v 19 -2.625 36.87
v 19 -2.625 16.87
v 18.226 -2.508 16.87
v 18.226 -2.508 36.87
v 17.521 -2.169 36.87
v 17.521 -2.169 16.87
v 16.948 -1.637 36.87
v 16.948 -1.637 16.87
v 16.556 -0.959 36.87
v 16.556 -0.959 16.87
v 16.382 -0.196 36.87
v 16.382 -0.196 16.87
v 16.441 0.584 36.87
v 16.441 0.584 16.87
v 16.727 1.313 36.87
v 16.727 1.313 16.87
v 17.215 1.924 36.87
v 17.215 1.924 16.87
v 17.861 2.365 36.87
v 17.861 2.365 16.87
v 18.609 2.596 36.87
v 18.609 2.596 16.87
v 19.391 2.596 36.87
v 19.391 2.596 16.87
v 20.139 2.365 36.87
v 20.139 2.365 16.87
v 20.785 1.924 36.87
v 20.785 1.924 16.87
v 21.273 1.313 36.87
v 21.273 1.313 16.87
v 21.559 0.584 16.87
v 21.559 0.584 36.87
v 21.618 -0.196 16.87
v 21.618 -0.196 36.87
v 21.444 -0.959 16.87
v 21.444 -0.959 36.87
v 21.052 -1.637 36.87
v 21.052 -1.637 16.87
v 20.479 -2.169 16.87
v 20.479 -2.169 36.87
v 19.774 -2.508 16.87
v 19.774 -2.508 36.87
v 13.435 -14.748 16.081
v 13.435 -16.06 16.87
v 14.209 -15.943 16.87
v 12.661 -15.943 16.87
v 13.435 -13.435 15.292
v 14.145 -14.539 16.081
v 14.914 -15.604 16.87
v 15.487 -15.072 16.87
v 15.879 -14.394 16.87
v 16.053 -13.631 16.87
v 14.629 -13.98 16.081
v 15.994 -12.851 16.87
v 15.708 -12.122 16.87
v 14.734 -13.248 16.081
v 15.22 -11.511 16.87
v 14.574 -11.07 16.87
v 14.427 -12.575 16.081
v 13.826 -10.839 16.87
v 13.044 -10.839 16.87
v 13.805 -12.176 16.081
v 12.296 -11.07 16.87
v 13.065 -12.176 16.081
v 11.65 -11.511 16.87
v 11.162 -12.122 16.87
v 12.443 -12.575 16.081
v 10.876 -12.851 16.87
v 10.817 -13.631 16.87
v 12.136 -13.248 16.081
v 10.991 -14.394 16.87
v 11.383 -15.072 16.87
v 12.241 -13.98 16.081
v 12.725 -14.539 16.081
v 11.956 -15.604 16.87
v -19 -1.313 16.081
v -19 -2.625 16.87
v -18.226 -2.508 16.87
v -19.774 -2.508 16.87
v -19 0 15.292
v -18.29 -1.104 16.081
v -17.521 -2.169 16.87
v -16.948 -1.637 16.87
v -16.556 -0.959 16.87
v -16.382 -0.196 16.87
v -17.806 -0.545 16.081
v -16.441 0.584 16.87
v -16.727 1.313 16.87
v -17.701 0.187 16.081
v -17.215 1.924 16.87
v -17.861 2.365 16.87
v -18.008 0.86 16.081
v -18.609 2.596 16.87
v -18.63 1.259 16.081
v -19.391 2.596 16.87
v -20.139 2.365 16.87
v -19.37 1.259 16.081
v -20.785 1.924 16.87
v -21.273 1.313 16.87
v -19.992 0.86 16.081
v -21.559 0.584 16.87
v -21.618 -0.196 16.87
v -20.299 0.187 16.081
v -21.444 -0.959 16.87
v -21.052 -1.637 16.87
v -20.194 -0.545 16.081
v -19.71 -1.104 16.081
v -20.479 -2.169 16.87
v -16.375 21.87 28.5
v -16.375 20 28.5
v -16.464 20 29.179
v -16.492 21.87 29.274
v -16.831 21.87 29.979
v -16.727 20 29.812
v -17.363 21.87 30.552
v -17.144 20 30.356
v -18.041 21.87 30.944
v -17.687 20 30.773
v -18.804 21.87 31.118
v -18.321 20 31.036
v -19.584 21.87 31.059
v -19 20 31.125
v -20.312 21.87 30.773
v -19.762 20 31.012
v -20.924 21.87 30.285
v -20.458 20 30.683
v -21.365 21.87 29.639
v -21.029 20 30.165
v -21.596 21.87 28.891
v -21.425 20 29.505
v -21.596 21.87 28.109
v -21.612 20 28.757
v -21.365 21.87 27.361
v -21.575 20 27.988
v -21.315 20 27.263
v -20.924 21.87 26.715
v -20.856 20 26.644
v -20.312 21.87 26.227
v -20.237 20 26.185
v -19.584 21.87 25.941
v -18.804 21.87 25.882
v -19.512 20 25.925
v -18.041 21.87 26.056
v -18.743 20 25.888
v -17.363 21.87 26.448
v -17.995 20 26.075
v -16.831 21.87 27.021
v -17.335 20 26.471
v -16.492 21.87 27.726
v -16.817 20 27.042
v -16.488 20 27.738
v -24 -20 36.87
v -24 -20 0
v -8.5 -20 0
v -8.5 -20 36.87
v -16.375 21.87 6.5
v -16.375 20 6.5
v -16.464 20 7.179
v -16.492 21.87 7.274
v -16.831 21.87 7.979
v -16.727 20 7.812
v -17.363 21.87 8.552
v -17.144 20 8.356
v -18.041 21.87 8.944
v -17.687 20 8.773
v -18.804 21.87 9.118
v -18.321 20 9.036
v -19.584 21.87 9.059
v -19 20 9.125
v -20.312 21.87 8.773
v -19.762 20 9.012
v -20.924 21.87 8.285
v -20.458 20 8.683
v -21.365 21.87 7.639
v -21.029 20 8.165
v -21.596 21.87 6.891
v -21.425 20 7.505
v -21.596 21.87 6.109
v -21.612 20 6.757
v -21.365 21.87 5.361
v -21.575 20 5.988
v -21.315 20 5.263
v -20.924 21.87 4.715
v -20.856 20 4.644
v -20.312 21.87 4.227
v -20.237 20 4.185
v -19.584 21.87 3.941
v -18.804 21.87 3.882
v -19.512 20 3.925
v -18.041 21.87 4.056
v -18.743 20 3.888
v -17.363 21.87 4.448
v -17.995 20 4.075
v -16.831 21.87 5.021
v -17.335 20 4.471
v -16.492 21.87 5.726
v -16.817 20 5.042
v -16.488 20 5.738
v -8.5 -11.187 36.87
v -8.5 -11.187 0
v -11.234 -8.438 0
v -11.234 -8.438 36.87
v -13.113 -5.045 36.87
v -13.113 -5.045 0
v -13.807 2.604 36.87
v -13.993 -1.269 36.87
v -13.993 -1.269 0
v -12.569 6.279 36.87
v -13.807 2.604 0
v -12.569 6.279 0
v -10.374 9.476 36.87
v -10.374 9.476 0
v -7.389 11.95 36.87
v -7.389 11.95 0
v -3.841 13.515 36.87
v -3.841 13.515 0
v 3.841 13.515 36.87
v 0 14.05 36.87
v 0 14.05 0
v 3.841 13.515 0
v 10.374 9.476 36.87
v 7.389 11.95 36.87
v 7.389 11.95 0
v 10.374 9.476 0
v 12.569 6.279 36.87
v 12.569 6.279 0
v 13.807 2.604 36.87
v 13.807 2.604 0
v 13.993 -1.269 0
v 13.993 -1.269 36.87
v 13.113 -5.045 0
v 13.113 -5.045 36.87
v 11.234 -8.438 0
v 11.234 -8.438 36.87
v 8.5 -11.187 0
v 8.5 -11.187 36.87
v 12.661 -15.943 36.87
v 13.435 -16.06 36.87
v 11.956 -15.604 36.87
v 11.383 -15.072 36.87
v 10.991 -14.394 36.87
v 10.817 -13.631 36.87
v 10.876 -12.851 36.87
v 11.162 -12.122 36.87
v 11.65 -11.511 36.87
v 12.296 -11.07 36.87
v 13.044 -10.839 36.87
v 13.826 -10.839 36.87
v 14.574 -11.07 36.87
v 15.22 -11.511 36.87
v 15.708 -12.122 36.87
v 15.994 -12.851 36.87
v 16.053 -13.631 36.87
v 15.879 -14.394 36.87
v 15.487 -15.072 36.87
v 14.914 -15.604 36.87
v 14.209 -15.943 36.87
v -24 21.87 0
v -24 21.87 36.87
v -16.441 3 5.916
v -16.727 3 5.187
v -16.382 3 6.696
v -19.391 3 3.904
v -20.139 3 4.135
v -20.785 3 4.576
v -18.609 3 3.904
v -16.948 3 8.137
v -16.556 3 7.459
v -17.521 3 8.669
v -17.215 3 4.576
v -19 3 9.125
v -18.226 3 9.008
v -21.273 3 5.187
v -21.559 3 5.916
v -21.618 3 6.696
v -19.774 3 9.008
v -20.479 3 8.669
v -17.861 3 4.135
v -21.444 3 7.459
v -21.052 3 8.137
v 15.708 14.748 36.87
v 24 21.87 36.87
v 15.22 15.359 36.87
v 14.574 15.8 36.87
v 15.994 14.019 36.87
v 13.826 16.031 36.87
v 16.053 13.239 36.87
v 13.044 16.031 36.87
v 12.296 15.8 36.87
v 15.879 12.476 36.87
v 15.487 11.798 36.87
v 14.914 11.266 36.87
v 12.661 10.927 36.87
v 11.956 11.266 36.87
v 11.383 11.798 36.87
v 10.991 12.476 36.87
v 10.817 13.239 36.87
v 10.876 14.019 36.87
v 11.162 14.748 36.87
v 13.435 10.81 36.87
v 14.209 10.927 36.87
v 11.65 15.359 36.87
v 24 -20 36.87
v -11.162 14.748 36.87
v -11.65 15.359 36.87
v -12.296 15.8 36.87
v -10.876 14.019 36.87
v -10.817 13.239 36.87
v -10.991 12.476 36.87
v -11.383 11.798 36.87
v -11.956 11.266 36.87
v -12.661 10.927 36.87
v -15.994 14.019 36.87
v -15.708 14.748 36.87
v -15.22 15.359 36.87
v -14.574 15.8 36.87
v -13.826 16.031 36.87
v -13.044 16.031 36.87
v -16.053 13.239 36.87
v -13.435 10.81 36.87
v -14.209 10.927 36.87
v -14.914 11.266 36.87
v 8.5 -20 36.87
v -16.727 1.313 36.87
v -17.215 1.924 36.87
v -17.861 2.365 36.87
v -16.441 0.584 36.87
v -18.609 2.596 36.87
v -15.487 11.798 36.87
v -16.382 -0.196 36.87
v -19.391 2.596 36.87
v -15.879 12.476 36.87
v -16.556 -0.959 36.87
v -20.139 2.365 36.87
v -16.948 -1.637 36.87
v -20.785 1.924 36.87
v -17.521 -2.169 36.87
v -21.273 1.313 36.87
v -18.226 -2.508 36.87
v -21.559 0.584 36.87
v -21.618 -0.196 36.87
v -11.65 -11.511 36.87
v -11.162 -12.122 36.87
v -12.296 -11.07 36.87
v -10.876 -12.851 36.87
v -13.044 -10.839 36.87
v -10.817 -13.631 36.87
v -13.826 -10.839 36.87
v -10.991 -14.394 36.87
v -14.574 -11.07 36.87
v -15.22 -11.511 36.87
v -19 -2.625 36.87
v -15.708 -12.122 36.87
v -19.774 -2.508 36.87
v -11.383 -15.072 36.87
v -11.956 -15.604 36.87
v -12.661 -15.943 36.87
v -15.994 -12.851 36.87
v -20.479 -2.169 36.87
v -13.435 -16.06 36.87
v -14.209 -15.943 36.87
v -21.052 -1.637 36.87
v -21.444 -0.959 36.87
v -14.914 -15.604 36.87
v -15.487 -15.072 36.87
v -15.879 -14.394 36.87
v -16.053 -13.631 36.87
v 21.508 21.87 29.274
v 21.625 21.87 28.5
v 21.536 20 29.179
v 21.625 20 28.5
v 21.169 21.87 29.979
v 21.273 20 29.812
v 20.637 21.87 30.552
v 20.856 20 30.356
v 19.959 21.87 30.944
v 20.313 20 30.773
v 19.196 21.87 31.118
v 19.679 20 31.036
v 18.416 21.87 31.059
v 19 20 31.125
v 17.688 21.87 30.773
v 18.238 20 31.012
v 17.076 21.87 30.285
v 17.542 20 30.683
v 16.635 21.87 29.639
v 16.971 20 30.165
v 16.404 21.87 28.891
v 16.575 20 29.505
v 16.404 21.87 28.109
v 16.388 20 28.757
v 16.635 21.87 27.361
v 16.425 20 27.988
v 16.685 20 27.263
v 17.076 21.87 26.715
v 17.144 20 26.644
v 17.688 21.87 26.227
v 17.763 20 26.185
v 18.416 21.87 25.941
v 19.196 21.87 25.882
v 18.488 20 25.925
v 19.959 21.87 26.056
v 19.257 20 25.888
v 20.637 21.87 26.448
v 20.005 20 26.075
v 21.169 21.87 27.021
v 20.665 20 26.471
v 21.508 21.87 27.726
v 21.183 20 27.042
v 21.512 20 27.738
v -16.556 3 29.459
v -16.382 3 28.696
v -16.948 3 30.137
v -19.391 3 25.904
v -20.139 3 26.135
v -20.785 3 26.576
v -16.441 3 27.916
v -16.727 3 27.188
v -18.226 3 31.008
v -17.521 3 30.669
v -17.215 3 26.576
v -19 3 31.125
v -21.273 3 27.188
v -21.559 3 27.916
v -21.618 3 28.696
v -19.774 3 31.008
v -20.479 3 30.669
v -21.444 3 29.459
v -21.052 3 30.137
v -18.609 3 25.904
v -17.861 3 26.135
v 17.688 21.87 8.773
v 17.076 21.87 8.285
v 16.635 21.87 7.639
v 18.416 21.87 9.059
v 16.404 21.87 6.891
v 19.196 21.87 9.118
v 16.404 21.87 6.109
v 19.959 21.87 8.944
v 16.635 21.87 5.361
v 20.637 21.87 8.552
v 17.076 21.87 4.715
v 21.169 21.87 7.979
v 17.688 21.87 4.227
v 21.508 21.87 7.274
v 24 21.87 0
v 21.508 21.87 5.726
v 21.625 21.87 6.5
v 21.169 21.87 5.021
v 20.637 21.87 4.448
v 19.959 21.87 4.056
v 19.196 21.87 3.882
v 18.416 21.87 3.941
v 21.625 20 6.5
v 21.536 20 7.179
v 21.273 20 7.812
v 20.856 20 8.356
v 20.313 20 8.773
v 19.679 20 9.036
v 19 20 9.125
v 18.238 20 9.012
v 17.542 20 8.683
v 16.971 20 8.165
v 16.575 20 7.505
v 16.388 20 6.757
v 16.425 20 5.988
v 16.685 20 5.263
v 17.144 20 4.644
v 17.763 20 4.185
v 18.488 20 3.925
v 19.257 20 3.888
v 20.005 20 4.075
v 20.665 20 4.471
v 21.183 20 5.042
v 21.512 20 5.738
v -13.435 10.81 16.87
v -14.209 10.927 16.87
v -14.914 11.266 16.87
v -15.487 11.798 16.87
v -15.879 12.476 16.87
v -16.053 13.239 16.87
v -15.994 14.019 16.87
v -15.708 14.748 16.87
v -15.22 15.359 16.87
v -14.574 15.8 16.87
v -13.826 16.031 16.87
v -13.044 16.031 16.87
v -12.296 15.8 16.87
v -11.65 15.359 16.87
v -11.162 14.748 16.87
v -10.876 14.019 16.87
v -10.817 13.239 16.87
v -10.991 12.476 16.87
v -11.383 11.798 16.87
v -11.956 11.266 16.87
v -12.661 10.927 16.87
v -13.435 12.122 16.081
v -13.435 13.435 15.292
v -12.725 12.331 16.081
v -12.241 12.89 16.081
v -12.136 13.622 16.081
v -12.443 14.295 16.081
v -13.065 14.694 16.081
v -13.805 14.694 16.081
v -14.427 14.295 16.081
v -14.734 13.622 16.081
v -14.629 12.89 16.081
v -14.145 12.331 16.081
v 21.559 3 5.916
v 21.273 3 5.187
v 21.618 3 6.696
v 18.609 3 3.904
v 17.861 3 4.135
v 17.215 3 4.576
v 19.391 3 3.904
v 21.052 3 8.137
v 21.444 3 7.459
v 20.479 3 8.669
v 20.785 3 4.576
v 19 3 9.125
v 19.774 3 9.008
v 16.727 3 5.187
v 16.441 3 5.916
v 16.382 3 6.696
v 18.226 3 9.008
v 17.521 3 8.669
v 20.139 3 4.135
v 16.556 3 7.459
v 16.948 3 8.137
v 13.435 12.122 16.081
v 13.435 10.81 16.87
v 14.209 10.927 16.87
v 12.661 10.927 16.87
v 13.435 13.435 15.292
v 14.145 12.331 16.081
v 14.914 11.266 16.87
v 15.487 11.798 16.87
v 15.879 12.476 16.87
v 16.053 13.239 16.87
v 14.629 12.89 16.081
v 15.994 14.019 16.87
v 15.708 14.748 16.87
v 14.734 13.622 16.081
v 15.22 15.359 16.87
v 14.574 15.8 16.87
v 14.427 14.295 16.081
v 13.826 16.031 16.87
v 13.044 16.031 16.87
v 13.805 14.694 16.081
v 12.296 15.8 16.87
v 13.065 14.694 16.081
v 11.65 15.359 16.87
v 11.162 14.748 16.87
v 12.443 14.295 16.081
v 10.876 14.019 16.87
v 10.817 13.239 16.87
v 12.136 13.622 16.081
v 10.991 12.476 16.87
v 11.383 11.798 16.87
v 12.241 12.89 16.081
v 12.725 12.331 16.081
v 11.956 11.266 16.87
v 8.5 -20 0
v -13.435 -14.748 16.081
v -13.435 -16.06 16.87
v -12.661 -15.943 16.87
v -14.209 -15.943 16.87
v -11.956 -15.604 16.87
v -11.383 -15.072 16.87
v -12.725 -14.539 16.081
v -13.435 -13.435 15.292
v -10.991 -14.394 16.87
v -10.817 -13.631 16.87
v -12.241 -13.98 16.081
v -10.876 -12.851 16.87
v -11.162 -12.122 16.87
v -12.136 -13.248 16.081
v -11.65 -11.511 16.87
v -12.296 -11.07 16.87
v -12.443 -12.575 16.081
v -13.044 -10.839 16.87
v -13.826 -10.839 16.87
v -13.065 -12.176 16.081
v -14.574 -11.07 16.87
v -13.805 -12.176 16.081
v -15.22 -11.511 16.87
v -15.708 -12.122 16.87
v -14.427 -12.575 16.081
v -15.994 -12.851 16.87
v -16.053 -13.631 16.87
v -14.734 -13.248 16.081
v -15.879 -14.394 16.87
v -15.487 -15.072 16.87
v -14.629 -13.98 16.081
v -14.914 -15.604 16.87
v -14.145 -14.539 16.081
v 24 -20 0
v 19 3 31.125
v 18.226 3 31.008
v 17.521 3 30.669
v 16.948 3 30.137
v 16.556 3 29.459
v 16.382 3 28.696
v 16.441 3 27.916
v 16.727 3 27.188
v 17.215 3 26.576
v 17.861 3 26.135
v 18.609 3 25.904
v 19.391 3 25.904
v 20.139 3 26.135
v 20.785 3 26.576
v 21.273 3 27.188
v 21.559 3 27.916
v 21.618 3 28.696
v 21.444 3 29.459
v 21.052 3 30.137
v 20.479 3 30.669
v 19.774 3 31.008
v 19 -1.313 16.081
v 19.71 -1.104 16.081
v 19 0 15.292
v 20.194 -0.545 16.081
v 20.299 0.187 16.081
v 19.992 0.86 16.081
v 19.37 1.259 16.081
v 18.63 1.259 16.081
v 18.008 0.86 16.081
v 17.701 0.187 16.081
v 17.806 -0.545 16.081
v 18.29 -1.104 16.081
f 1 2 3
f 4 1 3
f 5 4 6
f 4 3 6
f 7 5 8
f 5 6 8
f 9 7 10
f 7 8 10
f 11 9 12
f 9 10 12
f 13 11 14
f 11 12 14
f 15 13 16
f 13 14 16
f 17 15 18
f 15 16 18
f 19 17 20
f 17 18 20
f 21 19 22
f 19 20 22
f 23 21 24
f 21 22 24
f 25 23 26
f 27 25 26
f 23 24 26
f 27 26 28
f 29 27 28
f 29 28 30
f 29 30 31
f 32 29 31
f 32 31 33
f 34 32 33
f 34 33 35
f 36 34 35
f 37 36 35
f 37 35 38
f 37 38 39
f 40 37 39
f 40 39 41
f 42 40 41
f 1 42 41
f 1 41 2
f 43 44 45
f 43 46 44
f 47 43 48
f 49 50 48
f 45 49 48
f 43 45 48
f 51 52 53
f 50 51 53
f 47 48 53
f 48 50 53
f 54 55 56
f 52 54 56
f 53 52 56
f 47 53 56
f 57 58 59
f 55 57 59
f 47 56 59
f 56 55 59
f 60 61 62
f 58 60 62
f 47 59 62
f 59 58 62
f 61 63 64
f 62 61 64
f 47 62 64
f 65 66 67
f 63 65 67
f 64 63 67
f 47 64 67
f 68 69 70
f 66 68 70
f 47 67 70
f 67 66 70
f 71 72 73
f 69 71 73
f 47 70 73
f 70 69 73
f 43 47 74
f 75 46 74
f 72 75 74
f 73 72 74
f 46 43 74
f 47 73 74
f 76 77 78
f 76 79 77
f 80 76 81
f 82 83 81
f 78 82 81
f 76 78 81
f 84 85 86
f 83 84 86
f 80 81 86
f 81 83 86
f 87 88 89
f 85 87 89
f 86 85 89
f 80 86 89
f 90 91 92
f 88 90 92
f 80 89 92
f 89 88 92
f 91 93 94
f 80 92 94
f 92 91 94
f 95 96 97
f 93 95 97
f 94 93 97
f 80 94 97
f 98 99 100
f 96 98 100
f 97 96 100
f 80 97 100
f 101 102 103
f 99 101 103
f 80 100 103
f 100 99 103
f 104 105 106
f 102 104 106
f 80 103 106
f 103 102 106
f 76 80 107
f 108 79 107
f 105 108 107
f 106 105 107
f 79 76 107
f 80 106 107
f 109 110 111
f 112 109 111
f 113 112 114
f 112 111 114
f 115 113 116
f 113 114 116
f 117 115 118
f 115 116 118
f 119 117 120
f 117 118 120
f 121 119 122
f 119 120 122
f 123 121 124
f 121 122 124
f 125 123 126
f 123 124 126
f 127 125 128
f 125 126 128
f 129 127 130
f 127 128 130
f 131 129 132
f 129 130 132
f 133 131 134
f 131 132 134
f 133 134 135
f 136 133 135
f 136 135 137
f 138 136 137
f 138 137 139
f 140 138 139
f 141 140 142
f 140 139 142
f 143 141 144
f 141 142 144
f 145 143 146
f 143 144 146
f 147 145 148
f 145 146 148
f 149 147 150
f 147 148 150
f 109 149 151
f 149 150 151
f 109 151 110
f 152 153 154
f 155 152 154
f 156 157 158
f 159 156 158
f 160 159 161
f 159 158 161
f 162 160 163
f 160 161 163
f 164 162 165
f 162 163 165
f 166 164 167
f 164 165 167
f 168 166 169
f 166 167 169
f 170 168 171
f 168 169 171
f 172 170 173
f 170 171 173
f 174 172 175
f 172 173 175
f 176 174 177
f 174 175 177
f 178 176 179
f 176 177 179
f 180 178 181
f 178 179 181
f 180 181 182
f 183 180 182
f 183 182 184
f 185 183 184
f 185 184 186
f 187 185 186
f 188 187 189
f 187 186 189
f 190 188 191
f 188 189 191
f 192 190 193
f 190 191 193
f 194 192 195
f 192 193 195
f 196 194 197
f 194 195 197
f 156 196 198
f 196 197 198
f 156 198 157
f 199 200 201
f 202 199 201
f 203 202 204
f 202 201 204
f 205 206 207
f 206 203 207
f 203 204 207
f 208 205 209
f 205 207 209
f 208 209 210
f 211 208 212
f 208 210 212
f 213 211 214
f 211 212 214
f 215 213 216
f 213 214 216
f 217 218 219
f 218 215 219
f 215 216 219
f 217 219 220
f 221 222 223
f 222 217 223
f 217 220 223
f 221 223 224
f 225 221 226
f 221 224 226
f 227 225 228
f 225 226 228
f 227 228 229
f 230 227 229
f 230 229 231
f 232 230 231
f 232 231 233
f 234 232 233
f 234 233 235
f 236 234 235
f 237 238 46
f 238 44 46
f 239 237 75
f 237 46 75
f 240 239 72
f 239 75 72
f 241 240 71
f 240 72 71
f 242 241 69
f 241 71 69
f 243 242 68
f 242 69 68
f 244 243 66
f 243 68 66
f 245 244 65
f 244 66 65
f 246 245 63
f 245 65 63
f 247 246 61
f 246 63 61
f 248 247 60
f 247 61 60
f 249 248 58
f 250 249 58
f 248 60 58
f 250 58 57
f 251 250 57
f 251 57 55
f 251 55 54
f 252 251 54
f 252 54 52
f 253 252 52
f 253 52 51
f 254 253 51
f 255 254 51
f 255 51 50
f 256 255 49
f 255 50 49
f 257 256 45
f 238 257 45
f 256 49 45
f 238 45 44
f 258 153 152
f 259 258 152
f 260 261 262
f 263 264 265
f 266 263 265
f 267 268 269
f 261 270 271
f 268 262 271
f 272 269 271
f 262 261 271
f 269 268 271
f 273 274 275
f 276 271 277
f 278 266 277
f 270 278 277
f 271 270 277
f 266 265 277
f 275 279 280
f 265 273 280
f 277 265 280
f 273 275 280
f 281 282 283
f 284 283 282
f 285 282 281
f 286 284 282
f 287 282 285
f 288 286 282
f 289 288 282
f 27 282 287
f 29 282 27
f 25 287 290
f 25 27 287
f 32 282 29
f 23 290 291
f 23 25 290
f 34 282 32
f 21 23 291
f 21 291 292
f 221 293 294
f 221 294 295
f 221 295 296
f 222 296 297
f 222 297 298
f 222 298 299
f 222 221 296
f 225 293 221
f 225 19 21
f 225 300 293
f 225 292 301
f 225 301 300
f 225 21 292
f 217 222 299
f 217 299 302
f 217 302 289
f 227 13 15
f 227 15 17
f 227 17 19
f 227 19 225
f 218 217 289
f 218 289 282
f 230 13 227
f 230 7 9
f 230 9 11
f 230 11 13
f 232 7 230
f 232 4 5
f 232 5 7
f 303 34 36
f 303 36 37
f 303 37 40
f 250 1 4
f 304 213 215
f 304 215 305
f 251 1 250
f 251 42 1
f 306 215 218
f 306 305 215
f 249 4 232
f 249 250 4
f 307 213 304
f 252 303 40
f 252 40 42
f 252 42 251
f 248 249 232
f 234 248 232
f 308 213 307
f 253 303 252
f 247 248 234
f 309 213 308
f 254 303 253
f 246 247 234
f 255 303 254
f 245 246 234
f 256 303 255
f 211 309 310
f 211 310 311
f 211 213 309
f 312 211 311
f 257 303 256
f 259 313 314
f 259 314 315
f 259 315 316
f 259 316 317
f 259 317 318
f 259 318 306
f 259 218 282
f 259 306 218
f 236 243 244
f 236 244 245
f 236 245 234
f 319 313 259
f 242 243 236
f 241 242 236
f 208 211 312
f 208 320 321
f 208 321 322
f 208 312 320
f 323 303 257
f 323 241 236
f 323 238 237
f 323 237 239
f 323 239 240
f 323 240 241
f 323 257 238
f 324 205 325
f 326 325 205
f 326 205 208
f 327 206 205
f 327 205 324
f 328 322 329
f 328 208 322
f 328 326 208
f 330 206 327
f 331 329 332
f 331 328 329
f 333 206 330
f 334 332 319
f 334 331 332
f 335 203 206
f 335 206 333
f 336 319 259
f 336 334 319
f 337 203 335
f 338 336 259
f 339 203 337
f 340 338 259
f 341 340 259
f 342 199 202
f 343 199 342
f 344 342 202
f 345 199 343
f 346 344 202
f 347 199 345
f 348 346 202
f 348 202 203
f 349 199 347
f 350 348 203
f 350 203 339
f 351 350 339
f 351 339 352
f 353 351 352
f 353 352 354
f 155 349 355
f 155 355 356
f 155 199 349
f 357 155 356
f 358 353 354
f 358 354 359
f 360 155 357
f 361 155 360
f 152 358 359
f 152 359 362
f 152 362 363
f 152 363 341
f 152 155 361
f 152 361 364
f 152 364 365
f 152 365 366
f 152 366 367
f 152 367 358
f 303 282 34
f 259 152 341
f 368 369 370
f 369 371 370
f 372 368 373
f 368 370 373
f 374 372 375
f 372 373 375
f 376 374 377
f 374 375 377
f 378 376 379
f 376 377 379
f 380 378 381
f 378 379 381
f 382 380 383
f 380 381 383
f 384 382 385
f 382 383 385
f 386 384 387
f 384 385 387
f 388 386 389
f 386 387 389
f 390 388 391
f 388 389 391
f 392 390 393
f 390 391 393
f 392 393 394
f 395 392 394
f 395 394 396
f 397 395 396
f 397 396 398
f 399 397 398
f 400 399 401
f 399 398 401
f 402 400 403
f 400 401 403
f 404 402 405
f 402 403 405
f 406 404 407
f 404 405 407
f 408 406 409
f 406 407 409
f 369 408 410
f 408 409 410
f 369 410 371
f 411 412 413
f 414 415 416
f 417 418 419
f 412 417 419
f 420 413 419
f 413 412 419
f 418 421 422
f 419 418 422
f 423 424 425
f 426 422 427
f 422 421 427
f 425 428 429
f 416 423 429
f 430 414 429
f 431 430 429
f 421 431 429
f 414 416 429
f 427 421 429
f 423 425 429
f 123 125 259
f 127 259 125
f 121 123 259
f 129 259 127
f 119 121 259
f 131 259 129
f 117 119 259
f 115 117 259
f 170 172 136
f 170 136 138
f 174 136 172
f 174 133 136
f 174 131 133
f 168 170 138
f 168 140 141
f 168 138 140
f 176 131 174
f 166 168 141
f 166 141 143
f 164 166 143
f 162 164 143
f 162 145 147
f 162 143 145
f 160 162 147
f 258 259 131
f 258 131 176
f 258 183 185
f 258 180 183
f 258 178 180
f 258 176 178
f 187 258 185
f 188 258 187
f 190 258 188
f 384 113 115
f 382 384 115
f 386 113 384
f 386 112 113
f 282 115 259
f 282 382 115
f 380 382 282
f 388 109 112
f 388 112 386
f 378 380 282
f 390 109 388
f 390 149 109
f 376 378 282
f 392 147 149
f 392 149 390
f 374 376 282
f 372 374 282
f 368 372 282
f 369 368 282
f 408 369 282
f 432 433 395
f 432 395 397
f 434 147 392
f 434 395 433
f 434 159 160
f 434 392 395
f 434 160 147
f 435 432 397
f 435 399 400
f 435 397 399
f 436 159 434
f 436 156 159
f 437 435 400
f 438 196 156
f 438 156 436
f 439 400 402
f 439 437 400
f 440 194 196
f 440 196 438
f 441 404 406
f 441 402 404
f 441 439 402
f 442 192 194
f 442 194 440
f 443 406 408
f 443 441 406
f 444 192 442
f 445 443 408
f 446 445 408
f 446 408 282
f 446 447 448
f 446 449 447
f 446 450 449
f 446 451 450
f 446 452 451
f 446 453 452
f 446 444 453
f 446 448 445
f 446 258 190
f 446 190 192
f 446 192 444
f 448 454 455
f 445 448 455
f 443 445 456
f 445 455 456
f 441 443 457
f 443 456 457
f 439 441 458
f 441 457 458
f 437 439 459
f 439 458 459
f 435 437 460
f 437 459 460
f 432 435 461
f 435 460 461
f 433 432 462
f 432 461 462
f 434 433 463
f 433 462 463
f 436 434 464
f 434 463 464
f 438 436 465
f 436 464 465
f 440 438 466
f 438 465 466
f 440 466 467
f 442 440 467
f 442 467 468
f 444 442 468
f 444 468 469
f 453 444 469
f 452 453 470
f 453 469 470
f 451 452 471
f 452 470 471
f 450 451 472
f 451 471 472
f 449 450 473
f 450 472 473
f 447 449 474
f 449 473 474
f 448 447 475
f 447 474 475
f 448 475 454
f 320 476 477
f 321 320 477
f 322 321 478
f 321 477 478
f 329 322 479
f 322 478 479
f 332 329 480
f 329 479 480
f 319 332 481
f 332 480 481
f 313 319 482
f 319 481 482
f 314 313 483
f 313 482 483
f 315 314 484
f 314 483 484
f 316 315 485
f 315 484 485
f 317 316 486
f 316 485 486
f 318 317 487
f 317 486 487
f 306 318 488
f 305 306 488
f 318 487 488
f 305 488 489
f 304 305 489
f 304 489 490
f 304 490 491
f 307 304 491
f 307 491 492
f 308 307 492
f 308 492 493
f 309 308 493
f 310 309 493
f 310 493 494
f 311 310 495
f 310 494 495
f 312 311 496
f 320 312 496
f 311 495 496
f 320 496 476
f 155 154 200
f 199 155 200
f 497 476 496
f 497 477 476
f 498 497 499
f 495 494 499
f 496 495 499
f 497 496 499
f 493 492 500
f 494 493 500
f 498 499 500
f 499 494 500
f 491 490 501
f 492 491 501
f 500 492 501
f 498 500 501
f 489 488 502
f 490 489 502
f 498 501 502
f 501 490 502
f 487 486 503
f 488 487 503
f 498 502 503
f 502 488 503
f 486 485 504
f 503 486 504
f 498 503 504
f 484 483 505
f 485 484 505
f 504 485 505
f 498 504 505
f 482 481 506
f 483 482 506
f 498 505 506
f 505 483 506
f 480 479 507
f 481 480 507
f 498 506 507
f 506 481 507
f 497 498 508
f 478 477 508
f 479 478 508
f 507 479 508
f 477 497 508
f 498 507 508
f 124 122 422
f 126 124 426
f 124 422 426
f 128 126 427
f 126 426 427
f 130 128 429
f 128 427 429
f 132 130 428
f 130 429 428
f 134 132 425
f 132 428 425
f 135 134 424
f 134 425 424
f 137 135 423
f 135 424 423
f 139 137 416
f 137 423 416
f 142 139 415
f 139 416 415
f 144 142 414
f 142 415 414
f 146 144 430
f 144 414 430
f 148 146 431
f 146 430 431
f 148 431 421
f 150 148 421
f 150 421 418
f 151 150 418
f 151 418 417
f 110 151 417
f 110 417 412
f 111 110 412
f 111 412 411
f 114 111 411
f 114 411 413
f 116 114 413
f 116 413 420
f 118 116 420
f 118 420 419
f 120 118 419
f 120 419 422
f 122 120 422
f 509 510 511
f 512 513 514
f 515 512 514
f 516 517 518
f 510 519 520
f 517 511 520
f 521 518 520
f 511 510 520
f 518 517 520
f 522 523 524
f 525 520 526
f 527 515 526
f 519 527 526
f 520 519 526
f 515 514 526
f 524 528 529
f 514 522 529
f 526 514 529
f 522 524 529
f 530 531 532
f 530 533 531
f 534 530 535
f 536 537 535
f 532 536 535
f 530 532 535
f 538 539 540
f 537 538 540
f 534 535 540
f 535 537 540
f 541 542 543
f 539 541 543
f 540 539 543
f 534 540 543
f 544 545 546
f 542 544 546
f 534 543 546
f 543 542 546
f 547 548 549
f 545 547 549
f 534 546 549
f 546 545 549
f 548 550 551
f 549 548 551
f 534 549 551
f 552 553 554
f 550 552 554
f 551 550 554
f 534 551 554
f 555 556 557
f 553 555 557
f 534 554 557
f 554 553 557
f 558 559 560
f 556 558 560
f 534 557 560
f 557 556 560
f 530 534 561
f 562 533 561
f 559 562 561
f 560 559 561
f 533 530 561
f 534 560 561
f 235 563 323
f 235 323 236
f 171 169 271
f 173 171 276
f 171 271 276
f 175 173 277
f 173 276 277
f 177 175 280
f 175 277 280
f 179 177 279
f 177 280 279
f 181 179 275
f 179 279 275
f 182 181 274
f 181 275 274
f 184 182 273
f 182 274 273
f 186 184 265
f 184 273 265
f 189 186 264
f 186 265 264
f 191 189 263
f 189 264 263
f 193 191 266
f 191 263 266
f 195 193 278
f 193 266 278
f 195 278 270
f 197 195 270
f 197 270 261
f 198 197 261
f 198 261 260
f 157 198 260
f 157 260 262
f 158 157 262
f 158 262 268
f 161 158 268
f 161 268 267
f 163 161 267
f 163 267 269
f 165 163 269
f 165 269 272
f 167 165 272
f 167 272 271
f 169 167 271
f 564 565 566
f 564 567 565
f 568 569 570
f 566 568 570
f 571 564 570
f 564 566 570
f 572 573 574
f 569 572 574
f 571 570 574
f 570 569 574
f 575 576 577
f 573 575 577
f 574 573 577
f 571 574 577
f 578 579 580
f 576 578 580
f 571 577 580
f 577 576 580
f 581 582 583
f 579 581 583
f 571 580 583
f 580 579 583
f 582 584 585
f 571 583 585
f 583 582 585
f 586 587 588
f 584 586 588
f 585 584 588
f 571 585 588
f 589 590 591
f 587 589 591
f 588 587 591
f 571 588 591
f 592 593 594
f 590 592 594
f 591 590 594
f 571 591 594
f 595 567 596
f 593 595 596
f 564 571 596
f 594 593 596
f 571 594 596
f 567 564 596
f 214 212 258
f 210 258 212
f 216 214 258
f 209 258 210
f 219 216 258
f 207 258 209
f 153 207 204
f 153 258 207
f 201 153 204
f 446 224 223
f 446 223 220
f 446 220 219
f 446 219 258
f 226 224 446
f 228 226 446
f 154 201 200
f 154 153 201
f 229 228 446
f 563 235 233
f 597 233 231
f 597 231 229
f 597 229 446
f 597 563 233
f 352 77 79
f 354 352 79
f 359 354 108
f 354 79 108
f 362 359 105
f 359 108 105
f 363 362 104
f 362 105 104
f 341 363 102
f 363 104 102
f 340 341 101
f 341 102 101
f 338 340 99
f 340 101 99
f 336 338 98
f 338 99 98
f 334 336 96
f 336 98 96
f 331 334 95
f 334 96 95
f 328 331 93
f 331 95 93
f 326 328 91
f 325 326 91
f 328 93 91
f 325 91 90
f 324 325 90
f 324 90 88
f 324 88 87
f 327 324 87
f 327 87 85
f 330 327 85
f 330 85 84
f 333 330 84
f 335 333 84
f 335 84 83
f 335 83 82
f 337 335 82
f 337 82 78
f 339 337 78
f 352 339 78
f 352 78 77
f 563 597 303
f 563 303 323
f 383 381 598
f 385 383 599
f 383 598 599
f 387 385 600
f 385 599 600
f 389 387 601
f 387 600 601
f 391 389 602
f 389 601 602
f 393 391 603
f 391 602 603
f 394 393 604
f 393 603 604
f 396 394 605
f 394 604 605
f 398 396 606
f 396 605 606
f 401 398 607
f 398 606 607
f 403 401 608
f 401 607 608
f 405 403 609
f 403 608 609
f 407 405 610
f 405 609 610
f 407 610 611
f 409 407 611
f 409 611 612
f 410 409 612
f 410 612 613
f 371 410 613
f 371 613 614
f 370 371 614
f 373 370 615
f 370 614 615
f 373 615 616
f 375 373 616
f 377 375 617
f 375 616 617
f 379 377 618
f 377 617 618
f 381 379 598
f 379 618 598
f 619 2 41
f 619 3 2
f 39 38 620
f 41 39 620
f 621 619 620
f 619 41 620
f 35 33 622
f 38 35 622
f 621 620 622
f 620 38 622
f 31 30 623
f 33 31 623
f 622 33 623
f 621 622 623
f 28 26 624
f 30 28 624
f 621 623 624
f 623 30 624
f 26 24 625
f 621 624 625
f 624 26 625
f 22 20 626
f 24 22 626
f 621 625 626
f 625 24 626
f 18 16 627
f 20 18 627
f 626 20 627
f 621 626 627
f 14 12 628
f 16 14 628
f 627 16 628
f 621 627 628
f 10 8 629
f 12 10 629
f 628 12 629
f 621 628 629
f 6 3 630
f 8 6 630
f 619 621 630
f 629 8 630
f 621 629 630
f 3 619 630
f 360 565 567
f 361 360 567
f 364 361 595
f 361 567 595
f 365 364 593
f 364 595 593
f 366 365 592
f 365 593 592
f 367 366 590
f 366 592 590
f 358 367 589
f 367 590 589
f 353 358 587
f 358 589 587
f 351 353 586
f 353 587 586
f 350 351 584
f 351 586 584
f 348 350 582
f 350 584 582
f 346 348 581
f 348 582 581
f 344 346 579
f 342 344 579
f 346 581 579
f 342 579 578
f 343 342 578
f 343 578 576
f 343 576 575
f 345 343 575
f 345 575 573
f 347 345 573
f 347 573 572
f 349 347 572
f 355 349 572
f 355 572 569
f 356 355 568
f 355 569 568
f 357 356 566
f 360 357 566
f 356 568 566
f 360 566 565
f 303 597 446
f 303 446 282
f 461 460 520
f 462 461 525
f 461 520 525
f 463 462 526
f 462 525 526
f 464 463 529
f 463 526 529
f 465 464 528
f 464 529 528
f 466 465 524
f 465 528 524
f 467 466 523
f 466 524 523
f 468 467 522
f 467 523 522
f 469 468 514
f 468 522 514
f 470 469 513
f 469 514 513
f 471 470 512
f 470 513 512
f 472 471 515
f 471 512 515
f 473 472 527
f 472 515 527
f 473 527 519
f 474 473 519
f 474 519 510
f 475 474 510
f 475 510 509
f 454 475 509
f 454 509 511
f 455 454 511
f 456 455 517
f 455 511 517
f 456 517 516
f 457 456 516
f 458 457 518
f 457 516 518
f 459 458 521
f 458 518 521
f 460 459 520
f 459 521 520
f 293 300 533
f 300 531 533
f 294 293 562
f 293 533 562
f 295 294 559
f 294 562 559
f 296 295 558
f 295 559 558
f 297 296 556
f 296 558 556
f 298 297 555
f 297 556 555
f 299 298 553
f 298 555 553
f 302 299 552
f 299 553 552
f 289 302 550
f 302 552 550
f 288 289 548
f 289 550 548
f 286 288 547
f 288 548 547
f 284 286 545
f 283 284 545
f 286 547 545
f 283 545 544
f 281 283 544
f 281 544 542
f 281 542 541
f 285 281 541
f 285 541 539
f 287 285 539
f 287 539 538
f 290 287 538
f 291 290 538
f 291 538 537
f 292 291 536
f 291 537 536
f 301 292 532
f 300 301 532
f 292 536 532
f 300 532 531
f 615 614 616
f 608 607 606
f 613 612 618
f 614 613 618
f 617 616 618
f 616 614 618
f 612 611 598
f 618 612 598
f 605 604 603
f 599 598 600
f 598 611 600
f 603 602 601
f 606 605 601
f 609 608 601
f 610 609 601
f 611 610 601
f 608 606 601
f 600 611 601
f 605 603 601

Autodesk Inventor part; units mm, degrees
ref_plane "YZ Plane" through (0, 0, 0) normal (1, 0, 0) x (0, 1, 0)
ref_plane "XZ Plane" through (0, 0, 0) normal (0, 1, 0) x (-1, 0, 0)
ref_plane "XY Plane" through (0, 0, 0) normal (0, 0, 1) x (1, 0, 0)
sketch "Sketch1" plane through (0, 0, 0) normal (0, 0, 1) x (1, 0, 0)
  line L0 (-24, 20) -> (24, 20)
  line L1 (-24, 20) -> (-24, -20)
  line L2 (-24, -20) -> (-8.5, -20)
  line L3 (24, 20) -> (24, -20)
  line L4 (24, -20) -> (8.5, -20)
  arc A0 (8.5, -11.1872) -> (-8.5, -11.1872) centre (0, 0) ccw
  line L5 (-8.5, -20) -> (-8.5, -11.1872)
  line L6 (8.5, -20) -> (8.5, -11.1872)
  point P0 (0, 20)
  point P1 (-24, 0)
  dimension "d0" = 48
  dimension "d1" = 40
  dimension "d2" = 17
  dimension "d3" = 15.5
  dimension "d4" = 40
  dimension "d6" = 14.05
  dimension "d70" = 8.8128
extrude "Extrusion1" add sketch "Sketch1" along normal blind 36.8695
sketch "Sketch2" plane through (0, 0, 36.8695) normal (0, 0, 1) x (1, 0, 0)
  line L0 (-24, 20) -> (-24, -20) projected
  arc A0 (8.5, -11.1872) -> (-8.5, -11.1872) centre (0, 0) ccw projected
  circle A1 centre (0, 0) radius 19 construction
  point P0 (-19, 0)
  point P1 (-24, 0)
  point P2 (-13.435, -13.435)
  point P3 (-13.435, 13.435)
  point P4 (13.435, 13.435)
  point P5 (19, 0)
  point P6 (13.435, -13.435)
  dimension "d9" = 38
  dimension "d12" = 45
  dimension "d16" = 45
  dimension "d18" = 45
  dimension "d19" = 45
hole "Hole1" at (-19, 0, 36.8695) at (-13.435, -13.435, 36.8695) at (-13.435, 13.435, 36.8695) at (13.435, 13.435, 36.8695) at (19, 0, 36.8695) at (13.435, -13.435, 36.8695) direction (0, 0, -1) diameter 5.25 depth 20 tip angle 118
thread "Thread1" size "M5.5x0.5" class "6H" standard "ANSI Metric M Profile" full length
thread "Thread2" size "M5.5x0.5" class "6H" standard "ANSI Metric M Profile" full length
thread "Thread3" size "M5.5x0.5" class "6H" standard "ANSI Metric M Profile" full length
thread "Thread4" size "M5.5x0.5" class "6H" standard "ANSI Metric M Profile" full length
thread "Thread5" size "M5.5x0.5" class "6H" standard "ANSI Metric M Profile" full length
thread "Thread6" size "M5.5x0.5" class "6H" standard "ANSI Metric M Profile" full length
sketch "Sketch3" plane through (-24, 20, 0) normal (0, 1, 0) x (1, 0, 0)
  line L0 (0, 0) -> (48, 0) projected
  line L1 (0, 0) -> (0, -36.8695) projected
  point P0 (24, 0)
  point P1 (5, -6.5)
  point P2 (43, -6.5)
  point P3 (5, -28.5)
  point P4 (43, -28.5)
  dimension "d41" = 38
  dimension "d44" = 22
  dimension "d47" = 6.5
  dimension "d48" = 5
hole "Hole2" at (-19, 20, 6.5) at (19, 20, 6.5) at (-19, 20, 28.5) at (19, 20, 28.5) direction (0, -1, 0) diameter 5.25 depth 17
thread "Thread7" size "M5.5x0.5" class "6H" standard "ANSI Metric M Profile" full length
thread "Thread8" size "M5.5x0.5" class "6H" standard "ANSI Metric M Profile" full length
thread "Thread9" size "M5.5x0.5" class "6H" standard "ANSI Metric M Profile" full length
thread "Thread10" size "M5.5x0.5" class "6H" standard "ANSI Metric M Profile" full length
sketch "Sketch4" plane through (-24, 20, 0) normal (0, 1, 0) x (1, 0, 0)
  circle A0 centre (5, -28.5) radius 2.625 projected
  circle A1 centre (5, -6.5) radius 2.625 projected
  circle A2 centre (43, -6.5) radius 2.625 projected
  circle A3 centre (43, -28.5) radius 2.625 projected
  line L0 (0, 0) -> (48, 0) projected
  line L1 (0, 0) -> (0, -36.8695) projected
  line L2 (48, -36.8695) -> (0, -36.8695) projected
  line L3 (48, 0) -> (48, -36.8695) projected
  point P0 (24, 0)
  dimension "d64" = 48
  dimension "d65" = 36.8695
  dimension "d66" = 38
  dimension "d67" = 22
  dimension "d68" = 5
  dimension "d69" = 6.5
sketch "Sketch5" plane through (-24, 20, 0) normal (0, 1, 0) x (1, 0, 0)
  circle A0 centre (5, -28.5) radius 2.625 projected
  circle A1 centre (5, -6.5) radius 2.625 projected
  circle A2 centre (43, -6.5) radius 2.625 projected
  circle A3 centre (43, -28.5) radius 2.625 projected
  line L0 (0, 0) -> (48, 0) projected
  line L1 (0, 0) -> (0, -36.8695) projected
  line L2 (48, -36.8695) -> (0, -36.8695) projected
  line L3 (48, 0) -> (48, -36.8695) projected
  point P0 (24, 0)
extrude "Extrusion2" add sketch "Sketch5" along normal blind 1.8695
equation "\"d3\" = -0.5 * d2 + 0.5 * d0"
equation "\"d4\" = d1"
properties part number "HD16"
